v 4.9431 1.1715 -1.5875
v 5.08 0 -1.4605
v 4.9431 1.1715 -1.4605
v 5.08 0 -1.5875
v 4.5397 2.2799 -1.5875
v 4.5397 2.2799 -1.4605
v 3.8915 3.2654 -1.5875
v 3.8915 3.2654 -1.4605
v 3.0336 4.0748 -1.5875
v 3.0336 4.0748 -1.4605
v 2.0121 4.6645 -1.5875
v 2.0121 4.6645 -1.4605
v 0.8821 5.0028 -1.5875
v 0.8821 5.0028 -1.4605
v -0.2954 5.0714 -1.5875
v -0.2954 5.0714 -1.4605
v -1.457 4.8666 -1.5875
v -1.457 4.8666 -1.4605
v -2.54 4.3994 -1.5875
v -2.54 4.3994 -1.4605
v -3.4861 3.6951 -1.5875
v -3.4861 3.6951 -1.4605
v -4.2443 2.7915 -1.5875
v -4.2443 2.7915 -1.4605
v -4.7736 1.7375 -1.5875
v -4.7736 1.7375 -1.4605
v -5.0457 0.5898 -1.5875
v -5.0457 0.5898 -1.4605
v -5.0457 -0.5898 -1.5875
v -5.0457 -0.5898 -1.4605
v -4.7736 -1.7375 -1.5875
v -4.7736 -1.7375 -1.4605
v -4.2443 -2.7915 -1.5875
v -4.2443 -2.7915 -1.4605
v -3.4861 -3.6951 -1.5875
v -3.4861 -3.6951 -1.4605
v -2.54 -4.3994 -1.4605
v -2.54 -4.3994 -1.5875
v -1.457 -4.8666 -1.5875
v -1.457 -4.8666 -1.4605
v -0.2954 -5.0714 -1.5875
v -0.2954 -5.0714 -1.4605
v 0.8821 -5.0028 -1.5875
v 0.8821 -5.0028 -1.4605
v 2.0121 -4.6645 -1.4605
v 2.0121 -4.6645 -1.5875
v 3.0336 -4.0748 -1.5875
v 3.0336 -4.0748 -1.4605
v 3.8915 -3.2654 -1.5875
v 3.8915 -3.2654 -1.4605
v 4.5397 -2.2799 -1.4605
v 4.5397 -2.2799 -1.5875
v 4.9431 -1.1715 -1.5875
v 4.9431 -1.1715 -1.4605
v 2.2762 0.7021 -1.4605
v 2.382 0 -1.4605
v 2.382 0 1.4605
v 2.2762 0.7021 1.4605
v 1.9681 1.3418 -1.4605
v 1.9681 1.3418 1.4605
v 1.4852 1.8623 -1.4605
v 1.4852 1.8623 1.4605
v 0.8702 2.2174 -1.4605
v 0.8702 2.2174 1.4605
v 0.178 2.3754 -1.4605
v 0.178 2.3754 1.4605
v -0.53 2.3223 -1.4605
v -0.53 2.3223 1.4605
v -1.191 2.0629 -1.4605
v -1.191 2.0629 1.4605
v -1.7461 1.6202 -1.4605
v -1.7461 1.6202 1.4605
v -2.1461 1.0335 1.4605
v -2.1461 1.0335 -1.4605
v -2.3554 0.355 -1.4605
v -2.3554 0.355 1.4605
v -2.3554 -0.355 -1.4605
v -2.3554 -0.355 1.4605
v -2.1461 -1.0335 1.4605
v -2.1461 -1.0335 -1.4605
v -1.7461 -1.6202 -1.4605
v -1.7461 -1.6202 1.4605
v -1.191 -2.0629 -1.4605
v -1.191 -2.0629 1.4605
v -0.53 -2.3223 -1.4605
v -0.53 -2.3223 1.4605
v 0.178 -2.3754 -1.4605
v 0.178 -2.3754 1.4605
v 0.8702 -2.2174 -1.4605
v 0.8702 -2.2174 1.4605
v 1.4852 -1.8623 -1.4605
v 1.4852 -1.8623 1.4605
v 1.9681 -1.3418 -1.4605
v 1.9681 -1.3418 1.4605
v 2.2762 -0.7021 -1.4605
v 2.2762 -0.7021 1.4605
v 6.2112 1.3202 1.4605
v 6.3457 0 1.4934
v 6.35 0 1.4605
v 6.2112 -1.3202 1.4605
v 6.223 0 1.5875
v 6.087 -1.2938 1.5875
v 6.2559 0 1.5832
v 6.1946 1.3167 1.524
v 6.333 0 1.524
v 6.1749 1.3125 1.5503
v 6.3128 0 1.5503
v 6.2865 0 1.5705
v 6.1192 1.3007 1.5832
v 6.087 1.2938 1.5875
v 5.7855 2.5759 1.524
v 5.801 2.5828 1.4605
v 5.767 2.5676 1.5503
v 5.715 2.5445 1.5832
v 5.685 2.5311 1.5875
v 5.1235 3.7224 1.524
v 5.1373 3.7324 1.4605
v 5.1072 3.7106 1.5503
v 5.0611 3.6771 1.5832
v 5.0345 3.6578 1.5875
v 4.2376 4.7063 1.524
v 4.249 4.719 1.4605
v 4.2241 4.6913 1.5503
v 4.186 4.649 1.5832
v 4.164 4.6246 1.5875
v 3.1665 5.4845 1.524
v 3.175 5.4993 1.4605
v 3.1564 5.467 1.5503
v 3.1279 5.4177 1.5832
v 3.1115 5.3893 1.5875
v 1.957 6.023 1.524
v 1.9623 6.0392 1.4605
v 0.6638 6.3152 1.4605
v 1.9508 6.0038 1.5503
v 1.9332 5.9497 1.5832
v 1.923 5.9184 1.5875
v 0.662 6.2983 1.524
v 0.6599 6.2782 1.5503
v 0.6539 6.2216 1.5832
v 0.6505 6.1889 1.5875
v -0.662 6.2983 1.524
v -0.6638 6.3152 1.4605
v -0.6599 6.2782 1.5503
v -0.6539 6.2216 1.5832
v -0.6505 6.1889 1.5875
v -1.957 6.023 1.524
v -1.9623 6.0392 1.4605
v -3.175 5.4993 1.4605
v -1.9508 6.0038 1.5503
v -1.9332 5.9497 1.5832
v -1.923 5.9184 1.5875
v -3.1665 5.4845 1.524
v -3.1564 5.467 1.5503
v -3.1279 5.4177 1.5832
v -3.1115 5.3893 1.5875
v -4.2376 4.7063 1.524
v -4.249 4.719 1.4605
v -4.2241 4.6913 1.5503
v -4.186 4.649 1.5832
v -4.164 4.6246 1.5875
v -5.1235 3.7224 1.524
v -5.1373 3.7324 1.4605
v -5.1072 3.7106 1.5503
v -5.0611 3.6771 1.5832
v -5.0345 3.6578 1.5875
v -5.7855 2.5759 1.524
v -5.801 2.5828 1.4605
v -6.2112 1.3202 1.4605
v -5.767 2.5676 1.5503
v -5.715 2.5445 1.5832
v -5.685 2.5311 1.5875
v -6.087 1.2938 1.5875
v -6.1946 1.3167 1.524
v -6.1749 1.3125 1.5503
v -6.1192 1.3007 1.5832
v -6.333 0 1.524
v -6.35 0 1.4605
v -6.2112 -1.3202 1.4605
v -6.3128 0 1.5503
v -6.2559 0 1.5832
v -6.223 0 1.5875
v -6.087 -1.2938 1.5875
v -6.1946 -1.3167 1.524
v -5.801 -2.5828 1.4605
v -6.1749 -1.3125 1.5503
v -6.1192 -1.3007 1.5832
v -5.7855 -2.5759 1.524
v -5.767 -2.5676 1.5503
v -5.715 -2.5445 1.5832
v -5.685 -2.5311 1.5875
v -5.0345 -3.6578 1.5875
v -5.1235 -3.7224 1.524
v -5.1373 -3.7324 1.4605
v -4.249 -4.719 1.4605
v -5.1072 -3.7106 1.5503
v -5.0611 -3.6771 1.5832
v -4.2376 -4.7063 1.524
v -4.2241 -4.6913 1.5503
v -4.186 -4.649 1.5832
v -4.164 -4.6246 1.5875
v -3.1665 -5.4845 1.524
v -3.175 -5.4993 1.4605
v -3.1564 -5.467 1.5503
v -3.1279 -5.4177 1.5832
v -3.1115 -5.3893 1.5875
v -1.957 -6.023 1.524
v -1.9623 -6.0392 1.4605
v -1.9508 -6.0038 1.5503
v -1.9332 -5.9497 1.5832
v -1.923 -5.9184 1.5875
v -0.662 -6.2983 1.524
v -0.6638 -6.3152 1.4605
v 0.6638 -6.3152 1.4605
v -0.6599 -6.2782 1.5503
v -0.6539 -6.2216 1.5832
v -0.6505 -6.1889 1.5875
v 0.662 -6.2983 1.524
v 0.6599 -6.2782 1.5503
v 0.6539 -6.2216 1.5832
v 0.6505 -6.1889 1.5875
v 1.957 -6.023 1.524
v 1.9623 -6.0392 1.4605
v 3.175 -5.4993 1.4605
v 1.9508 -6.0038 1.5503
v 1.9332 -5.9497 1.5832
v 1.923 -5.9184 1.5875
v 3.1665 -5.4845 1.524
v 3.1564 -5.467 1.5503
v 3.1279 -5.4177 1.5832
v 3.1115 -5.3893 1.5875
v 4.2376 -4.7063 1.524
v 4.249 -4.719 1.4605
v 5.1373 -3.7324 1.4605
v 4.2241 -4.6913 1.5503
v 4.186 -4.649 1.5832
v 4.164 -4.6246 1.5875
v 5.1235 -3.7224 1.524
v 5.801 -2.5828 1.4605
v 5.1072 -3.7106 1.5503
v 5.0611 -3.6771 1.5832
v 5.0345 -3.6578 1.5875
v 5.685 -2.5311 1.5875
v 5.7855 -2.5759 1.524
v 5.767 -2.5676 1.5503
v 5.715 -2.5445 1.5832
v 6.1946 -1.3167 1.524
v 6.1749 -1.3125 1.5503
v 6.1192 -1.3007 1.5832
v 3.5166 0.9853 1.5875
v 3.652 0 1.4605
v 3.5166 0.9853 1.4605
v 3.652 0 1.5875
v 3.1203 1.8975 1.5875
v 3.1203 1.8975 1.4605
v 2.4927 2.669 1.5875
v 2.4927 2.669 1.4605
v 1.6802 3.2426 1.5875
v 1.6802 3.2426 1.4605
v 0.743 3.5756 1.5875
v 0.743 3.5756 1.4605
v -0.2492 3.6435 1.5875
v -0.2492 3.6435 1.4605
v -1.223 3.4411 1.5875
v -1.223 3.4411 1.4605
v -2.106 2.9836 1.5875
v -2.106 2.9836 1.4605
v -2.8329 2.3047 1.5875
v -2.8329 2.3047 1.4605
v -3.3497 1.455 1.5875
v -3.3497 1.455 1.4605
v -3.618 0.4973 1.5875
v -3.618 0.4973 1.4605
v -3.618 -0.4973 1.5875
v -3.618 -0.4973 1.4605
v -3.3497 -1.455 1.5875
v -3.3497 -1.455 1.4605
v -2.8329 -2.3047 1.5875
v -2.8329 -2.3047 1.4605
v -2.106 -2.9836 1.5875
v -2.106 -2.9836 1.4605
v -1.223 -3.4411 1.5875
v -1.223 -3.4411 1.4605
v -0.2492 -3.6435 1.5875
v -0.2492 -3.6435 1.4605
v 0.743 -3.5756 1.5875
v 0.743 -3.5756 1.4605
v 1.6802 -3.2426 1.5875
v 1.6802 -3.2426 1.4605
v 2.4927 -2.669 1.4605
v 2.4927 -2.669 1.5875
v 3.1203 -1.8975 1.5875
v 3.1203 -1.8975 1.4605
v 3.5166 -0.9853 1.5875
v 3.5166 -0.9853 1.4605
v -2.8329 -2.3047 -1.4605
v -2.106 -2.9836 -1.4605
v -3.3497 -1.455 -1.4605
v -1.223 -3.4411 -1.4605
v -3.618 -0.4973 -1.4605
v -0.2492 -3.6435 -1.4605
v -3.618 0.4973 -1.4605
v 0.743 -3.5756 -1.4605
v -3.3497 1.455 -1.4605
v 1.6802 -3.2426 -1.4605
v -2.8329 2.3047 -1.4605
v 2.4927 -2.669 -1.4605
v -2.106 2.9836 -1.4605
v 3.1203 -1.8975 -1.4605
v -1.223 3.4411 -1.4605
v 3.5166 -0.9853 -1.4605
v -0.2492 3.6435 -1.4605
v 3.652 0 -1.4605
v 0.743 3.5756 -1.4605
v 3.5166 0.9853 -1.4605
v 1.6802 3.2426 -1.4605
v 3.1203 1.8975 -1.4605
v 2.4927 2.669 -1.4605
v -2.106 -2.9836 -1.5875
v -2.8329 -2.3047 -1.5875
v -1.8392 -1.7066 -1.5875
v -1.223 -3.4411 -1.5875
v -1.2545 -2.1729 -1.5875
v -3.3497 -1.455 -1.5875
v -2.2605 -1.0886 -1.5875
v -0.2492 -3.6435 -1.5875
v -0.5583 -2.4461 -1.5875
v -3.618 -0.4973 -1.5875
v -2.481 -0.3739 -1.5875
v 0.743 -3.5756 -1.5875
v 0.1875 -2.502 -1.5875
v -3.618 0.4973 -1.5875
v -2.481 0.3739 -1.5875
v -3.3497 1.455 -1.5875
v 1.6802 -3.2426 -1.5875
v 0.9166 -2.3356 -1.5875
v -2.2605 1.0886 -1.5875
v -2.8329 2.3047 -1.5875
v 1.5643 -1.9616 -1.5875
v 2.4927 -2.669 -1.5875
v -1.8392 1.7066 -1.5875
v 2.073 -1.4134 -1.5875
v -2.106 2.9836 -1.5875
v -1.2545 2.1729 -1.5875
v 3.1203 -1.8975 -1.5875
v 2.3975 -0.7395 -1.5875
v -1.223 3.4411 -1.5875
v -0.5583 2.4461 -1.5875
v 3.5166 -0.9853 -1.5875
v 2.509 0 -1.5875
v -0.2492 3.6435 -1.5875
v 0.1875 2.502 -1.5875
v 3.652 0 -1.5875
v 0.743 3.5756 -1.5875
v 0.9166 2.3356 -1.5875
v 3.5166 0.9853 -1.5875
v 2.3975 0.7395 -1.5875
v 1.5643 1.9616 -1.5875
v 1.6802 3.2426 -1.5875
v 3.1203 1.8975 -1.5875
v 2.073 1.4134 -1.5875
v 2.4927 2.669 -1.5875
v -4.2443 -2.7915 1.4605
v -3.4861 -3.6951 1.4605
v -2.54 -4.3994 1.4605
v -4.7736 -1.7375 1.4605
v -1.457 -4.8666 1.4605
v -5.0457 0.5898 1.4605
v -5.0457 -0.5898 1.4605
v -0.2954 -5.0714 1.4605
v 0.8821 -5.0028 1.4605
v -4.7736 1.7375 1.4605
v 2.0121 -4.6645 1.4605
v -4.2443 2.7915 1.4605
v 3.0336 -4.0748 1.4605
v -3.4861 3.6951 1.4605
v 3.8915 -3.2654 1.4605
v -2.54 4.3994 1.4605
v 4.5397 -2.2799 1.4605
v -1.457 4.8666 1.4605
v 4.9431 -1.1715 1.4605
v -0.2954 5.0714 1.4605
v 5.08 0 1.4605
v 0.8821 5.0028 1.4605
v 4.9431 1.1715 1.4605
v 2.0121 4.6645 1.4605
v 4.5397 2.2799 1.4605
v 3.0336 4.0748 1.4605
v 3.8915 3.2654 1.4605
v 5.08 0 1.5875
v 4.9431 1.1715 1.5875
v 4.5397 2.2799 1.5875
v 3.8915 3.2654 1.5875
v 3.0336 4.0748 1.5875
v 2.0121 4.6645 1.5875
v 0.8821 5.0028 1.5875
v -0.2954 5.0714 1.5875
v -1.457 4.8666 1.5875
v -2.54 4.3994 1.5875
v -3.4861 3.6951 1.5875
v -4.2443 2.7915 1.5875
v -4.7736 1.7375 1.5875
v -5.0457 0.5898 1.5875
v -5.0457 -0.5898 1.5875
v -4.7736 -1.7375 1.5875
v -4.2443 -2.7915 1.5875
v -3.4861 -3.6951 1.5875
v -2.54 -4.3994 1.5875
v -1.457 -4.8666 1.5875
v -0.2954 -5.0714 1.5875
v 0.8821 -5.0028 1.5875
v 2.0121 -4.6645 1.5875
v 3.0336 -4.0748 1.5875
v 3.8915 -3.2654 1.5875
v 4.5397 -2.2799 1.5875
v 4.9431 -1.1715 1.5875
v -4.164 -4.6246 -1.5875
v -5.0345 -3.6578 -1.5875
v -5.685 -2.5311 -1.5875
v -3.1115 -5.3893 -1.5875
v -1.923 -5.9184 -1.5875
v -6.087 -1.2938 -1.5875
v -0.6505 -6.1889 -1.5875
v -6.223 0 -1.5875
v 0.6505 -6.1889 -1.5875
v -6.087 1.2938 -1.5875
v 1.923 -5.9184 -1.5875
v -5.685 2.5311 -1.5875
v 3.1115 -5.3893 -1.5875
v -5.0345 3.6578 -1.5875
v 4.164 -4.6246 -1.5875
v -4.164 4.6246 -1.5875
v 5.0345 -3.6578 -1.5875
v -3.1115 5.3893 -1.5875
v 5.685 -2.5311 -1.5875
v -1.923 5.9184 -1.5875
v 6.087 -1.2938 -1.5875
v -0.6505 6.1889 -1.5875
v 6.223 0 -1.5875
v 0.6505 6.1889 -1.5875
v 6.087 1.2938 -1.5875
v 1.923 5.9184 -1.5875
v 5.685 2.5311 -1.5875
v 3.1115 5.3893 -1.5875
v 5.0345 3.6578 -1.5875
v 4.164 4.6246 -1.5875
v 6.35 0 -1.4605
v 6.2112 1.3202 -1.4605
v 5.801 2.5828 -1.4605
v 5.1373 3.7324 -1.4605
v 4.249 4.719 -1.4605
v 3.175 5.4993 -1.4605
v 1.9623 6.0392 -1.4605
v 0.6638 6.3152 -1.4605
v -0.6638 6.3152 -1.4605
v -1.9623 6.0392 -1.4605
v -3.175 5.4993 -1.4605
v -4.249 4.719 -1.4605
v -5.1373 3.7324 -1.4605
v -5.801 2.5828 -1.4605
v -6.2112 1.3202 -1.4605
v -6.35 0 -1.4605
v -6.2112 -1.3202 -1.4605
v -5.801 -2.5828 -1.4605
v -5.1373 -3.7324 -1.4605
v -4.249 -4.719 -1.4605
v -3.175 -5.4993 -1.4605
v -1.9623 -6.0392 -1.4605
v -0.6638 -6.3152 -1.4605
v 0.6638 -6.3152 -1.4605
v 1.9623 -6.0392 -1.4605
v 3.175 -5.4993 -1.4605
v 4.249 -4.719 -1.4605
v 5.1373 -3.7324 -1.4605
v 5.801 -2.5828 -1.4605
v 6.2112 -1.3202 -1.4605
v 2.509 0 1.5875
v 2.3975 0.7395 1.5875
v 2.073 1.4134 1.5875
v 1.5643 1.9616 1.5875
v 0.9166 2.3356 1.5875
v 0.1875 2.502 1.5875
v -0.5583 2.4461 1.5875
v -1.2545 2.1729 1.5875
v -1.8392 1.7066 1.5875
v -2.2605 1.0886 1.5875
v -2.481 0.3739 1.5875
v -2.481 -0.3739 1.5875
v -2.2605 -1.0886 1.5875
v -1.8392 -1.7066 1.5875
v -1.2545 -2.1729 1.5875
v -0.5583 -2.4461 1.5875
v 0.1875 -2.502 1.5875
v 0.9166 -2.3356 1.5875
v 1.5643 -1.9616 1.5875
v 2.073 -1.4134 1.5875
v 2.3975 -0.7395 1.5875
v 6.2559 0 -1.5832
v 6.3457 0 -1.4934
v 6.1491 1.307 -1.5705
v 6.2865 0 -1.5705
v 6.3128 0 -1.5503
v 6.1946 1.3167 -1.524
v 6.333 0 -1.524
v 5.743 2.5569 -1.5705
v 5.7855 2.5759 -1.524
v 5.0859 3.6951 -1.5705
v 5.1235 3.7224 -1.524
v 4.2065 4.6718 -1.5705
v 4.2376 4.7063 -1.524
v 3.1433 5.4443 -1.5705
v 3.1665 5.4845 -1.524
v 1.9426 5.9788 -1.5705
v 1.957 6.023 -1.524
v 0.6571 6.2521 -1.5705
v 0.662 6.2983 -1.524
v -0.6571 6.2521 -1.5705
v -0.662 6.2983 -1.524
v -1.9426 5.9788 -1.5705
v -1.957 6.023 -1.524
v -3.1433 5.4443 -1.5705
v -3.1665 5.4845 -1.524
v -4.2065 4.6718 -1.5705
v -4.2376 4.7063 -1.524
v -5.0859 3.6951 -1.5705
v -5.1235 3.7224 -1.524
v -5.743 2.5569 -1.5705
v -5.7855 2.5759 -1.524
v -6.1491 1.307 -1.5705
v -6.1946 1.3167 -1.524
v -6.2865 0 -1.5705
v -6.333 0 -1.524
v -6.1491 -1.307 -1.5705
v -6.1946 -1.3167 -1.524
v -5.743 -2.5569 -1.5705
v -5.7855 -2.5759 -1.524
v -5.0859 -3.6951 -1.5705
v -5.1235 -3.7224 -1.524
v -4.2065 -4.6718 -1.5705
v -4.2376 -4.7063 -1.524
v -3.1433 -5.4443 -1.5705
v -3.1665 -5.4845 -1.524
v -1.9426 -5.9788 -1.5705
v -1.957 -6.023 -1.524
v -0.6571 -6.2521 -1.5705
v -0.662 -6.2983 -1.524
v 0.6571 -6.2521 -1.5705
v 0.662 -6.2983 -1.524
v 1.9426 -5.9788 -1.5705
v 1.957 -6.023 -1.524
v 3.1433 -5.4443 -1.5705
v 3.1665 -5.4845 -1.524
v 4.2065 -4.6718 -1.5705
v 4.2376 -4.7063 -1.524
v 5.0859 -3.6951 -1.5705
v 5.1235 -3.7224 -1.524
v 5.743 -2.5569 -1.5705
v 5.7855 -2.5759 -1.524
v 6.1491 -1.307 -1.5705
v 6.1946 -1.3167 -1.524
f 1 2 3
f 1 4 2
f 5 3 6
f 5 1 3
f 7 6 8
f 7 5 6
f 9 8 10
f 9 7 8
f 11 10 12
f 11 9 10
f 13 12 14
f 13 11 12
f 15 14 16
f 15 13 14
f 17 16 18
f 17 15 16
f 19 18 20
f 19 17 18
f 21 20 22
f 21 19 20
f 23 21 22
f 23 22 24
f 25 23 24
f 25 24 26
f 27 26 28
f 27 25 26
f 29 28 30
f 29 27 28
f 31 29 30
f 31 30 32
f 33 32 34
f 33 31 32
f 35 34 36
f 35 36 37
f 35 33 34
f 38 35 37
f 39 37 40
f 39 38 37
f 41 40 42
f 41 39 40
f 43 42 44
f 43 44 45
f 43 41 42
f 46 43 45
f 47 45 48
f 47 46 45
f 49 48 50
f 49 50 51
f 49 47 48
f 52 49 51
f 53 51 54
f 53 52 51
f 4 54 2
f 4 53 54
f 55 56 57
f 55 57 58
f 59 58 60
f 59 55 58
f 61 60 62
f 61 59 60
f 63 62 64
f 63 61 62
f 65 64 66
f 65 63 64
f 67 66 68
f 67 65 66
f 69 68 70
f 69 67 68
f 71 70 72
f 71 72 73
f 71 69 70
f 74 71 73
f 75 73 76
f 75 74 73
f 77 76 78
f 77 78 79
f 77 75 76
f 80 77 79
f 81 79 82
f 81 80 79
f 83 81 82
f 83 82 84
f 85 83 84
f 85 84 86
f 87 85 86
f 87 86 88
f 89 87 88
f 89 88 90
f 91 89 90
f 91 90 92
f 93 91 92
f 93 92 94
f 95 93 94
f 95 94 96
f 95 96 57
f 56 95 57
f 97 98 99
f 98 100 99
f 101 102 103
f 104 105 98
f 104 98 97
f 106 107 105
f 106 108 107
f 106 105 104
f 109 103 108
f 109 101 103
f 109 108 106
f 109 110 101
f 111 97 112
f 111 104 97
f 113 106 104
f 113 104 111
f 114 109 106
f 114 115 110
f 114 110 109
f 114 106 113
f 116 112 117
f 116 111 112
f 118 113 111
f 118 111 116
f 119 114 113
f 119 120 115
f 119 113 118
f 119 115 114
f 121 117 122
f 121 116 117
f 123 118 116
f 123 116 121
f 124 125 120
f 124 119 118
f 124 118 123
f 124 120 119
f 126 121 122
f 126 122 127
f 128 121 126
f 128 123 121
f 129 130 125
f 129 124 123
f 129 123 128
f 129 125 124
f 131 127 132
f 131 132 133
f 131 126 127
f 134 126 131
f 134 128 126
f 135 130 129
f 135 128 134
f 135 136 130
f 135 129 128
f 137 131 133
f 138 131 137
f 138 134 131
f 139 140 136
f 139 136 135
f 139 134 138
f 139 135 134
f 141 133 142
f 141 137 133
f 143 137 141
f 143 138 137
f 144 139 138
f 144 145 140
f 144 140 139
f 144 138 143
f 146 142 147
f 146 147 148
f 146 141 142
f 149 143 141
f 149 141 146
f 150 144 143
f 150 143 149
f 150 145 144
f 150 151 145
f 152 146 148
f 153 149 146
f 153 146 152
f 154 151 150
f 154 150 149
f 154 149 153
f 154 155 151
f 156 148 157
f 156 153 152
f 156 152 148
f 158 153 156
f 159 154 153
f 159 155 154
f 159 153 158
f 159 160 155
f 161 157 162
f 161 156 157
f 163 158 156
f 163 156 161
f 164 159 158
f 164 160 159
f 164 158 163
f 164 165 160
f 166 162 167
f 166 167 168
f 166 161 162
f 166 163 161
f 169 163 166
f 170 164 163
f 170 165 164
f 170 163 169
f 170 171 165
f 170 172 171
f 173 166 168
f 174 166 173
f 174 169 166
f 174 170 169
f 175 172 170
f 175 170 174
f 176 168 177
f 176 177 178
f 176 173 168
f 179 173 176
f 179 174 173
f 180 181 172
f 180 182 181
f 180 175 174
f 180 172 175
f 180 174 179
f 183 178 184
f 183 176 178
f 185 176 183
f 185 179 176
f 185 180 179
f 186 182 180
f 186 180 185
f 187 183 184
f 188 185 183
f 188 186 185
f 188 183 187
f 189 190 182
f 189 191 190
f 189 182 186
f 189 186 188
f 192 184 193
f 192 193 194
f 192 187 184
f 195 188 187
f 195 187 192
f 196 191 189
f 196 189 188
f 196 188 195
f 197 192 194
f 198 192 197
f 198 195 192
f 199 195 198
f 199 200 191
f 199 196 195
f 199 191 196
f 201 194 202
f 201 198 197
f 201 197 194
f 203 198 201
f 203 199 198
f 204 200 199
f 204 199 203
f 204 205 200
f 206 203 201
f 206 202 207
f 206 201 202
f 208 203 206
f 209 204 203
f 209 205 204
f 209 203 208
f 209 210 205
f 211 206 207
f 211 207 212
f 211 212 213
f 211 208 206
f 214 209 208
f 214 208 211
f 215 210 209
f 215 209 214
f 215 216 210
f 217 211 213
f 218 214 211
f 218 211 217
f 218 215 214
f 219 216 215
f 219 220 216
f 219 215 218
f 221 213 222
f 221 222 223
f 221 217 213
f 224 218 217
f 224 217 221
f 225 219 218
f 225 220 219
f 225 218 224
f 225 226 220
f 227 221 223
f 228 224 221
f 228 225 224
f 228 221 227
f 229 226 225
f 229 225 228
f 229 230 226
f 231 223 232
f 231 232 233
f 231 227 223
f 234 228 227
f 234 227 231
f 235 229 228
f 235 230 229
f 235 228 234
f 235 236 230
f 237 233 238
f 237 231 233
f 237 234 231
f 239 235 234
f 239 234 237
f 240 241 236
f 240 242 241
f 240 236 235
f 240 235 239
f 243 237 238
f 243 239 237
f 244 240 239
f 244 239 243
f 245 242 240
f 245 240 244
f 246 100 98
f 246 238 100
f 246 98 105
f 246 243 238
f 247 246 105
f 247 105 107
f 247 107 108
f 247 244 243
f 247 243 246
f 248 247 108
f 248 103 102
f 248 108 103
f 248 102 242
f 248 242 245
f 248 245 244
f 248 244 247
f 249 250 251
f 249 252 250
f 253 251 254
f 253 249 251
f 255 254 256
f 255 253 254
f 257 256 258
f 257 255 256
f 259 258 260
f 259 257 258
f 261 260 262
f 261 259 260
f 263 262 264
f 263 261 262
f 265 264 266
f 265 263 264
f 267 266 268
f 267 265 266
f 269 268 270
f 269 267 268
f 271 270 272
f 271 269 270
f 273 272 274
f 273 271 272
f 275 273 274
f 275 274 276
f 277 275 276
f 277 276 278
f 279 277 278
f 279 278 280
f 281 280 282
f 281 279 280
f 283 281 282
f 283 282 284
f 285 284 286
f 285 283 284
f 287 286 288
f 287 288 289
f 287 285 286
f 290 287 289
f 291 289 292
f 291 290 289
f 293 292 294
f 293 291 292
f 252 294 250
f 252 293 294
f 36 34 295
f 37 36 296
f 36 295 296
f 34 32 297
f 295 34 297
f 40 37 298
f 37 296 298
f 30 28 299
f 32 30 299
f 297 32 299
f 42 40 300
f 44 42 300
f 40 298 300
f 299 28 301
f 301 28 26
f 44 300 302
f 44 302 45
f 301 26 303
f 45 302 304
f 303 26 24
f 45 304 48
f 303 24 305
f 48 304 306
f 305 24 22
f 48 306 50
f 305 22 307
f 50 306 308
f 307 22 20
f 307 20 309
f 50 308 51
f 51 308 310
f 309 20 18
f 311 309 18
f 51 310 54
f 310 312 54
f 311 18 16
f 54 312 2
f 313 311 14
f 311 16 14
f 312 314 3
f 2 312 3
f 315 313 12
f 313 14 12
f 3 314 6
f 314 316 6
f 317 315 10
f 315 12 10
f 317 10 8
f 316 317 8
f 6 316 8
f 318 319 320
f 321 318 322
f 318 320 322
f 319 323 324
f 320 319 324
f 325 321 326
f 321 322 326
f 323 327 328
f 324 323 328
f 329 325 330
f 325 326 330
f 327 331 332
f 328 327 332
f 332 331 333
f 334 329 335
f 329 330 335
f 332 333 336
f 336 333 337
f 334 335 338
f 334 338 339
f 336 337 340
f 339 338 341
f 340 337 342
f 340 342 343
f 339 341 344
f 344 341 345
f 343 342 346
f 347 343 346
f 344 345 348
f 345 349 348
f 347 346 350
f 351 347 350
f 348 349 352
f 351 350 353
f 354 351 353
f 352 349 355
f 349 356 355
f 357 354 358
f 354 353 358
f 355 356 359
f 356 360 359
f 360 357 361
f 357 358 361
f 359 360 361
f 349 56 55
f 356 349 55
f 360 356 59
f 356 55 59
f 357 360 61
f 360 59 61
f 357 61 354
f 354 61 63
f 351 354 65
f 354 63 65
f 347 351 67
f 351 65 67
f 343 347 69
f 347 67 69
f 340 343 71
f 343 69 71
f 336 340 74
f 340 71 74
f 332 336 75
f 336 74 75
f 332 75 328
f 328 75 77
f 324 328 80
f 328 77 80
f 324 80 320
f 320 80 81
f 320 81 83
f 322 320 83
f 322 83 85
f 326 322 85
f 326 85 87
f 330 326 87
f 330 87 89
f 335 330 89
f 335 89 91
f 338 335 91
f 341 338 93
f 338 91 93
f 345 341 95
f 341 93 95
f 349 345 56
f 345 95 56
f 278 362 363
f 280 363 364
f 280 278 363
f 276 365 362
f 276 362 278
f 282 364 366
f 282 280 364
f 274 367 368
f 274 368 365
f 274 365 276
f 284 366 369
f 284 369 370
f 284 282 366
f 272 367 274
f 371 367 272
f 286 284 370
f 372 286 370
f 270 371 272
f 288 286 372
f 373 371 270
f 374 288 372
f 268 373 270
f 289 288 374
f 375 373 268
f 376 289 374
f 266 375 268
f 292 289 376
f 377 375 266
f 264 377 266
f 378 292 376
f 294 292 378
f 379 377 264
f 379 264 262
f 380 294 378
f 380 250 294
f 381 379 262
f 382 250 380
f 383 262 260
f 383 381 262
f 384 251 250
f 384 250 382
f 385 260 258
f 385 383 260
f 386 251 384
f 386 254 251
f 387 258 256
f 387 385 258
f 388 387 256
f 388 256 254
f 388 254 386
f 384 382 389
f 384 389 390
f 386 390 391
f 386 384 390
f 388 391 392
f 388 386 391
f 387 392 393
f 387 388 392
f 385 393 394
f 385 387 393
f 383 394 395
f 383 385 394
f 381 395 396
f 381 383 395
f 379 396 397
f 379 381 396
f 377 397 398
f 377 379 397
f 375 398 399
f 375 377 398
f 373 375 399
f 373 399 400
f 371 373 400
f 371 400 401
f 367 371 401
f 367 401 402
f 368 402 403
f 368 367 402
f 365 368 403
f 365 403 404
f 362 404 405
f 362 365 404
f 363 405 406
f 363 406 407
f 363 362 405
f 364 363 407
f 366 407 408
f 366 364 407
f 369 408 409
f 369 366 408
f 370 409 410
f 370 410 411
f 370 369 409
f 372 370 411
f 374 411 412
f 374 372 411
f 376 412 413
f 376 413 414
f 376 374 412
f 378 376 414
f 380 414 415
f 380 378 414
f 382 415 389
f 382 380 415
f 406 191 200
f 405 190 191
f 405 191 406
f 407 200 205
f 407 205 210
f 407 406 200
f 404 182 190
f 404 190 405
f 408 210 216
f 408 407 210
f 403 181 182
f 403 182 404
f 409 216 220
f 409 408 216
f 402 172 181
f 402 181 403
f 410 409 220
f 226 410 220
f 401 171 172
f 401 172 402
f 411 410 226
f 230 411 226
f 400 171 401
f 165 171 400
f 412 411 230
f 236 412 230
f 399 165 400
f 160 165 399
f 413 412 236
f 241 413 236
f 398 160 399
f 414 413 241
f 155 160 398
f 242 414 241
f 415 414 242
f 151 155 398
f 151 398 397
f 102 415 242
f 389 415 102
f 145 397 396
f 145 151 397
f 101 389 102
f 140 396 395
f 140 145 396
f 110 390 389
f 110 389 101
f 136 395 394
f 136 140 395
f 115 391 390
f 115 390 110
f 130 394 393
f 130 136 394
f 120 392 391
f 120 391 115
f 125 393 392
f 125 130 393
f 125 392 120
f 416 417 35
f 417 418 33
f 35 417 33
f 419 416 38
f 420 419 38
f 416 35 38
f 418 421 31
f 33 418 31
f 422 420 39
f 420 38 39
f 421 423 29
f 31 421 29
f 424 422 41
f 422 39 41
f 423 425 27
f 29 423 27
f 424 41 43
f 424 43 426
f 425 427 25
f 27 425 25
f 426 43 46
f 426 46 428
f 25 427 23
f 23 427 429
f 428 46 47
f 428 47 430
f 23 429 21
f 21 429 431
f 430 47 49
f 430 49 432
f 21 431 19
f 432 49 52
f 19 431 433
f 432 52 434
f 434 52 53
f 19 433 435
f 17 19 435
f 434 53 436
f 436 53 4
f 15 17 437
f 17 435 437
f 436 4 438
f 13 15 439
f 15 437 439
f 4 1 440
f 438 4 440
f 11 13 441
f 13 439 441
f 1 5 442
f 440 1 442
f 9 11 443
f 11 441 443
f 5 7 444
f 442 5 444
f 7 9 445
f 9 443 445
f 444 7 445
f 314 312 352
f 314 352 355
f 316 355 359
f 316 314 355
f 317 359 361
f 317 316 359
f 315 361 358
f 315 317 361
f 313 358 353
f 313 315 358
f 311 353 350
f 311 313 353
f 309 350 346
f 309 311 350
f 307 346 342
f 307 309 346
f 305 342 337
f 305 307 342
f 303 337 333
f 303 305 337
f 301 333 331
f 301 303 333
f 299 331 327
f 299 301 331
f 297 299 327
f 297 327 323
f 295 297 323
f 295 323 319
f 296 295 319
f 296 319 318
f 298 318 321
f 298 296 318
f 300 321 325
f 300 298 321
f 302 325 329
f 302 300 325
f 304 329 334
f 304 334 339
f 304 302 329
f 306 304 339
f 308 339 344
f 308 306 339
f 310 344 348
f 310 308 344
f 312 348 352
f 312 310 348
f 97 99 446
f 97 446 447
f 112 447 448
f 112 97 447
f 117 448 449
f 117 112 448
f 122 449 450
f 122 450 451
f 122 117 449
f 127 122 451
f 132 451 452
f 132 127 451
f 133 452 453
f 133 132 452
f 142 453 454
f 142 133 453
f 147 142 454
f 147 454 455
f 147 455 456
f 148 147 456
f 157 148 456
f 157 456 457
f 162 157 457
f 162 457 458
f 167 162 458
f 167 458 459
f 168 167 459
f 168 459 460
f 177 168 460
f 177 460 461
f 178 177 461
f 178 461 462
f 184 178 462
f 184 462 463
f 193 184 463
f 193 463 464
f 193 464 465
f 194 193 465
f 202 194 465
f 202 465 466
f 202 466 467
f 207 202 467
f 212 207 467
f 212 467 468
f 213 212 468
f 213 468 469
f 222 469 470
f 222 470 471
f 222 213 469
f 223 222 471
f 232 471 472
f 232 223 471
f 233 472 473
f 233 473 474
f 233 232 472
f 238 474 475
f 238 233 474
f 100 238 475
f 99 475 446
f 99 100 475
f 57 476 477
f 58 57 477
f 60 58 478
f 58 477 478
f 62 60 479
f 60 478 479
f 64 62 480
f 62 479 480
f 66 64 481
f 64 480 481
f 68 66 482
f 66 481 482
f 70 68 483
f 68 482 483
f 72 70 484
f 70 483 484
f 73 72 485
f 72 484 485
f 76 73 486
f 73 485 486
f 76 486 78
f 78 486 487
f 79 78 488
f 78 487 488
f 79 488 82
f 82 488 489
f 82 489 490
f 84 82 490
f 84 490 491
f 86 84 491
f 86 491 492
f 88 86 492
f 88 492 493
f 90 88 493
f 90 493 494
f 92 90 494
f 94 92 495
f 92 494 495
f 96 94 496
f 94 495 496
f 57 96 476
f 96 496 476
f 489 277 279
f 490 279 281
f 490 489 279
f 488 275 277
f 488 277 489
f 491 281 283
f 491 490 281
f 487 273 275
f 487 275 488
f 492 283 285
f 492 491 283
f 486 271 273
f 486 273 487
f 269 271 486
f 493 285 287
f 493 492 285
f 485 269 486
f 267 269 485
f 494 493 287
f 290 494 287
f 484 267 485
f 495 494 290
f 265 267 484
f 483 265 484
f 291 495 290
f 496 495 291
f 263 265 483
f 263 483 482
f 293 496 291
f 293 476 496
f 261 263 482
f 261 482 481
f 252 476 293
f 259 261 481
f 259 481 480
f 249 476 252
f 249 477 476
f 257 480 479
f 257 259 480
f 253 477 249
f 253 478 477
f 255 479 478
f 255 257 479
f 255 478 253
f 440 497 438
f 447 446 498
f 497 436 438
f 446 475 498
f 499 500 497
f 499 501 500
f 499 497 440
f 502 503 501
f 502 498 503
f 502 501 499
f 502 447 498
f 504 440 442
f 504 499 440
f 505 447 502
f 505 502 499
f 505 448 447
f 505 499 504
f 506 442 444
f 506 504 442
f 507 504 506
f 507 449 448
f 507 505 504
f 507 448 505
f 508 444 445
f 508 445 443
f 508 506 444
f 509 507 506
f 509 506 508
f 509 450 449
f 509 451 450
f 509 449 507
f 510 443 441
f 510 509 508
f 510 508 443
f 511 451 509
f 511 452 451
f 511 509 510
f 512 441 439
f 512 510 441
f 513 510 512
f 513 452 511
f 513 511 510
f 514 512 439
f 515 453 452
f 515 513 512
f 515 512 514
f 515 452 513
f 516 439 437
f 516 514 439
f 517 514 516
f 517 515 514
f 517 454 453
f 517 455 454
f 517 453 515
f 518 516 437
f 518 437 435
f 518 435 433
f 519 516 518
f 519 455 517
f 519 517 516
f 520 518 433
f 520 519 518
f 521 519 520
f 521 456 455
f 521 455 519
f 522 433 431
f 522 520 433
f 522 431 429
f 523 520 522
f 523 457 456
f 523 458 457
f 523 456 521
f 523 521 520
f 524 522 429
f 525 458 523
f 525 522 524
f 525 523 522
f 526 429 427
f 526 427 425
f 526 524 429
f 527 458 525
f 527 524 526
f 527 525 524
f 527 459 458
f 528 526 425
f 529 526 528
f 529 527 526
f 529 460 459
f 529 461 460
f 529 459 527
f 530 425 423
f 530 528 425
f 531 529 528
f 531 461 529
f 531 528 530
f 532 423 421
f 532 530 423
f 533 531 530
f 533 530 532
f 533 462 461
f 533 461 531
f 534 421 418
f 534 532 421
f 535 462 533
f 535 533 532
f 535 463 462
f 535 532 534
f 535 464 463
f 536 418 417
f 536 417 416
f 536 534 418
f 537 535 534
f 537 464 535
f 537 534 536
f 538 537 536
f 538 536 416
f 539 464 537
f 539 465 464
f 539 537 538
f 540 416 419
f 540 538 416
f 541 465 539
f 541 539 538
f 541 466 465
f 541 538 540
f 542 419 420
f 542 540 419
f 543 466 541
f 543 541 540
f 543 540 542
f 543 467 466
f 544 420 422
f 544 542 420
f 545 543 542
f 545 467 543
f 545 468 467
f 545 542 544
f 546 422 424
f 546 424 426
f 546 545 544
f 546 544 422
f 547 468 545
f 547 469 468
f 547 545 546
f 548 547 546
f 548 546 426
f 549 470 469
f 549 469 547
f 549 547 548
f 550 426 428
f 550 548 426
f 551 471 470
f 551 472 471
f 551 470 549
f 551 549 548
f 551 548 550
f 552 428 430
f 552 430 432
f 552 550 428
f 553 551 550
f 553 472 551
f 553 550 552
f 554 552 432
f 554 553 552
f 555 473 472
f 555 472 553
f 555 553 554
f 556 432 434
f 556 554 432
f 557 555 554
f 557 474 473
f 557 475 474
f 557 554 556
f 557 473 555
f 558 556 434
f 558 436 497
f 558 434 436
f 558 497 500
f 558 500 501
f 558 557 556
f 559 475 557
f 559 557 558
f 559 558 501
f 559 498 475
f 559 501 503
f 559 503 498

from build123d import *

# Parameters (mm, degrees)
SKETCH1_R             = 6.35
SKETCH1_R_2           = 5.08
BOSS_EXTRUDE1_DEPTH   = 1.5875
SKETCH1_R_3           = 3.652012
SKETCH1_R_4           = 2.382012
BOSS_EXTRUDE1_2_DEPTH = 1.5875
SKETCH2_R             = 5.08
SKETCH2_R_2           = 3.652012
BOSS_EXTRUDE2_DEPTH   = 1.4605
FILLET1_R             = 0.127
CHAMFER1_SIZE         = 0.127


with BuildPart() as part:
    # Sketch1 → Boss-Extrude1 (new, symmetric)
    with BuildSketch(Plane.XY):
        Circle(SKETCH1_R)
        Circle(SKETCH1_R_2, mode=Mode.SUBTRACT)
    extrude(amount=BOSS_EXTRUDE1_DEPTH, both=True)



with BuildPart() as body_2:
    # Sketch1 → Boss-Extrude1 2 (new, symmetric)
    with BuildSketch(Plane.XY):
        Circle(SKETCH1_R_3)
        Circle(SKETCH1_R_4, mode=Mode.SUBTRACT)
    extrude(amount=BOSS_EXTRUDE1_2_DEPTH, both=True)


with BuildPart() as part_1:
    add(part.part)

    add(body_2.part)  # Boss-Extrude2 merges body 2
    # Sketch2 → Boss-Extrude2 (add, symmetric)
    with BuildSketch(Plane.XY):
        Circle(SKETCH2_R)
        Circle(SKETCH2_R_2, mode=Mode.SUBTRACT)
    extrude(amount=BOSS_EXTRUDE2_DEPTH, both=True)

    # Fillet1
    fillet1_edges = [part_1.edges().sort_by_distance(p)[0] for p in [
        (-6.35, 0, 1.5875),
        (-6.35, 0, -1.5875),
    ]]
    fillet(fillet1_edges, radius=FILLET1_R)

    # Chamfer1
    chamfer1_edges = [part_1.edges().sort_by_distance(p)[0] for p in [
        (-2.382012, 0, 1.5875),
        (-2.382012, 0, -1.5875),
    ]]
    chamfer(chamfer1_edges, length=CHAMFER1_SIZE)


solid = part_1.part
